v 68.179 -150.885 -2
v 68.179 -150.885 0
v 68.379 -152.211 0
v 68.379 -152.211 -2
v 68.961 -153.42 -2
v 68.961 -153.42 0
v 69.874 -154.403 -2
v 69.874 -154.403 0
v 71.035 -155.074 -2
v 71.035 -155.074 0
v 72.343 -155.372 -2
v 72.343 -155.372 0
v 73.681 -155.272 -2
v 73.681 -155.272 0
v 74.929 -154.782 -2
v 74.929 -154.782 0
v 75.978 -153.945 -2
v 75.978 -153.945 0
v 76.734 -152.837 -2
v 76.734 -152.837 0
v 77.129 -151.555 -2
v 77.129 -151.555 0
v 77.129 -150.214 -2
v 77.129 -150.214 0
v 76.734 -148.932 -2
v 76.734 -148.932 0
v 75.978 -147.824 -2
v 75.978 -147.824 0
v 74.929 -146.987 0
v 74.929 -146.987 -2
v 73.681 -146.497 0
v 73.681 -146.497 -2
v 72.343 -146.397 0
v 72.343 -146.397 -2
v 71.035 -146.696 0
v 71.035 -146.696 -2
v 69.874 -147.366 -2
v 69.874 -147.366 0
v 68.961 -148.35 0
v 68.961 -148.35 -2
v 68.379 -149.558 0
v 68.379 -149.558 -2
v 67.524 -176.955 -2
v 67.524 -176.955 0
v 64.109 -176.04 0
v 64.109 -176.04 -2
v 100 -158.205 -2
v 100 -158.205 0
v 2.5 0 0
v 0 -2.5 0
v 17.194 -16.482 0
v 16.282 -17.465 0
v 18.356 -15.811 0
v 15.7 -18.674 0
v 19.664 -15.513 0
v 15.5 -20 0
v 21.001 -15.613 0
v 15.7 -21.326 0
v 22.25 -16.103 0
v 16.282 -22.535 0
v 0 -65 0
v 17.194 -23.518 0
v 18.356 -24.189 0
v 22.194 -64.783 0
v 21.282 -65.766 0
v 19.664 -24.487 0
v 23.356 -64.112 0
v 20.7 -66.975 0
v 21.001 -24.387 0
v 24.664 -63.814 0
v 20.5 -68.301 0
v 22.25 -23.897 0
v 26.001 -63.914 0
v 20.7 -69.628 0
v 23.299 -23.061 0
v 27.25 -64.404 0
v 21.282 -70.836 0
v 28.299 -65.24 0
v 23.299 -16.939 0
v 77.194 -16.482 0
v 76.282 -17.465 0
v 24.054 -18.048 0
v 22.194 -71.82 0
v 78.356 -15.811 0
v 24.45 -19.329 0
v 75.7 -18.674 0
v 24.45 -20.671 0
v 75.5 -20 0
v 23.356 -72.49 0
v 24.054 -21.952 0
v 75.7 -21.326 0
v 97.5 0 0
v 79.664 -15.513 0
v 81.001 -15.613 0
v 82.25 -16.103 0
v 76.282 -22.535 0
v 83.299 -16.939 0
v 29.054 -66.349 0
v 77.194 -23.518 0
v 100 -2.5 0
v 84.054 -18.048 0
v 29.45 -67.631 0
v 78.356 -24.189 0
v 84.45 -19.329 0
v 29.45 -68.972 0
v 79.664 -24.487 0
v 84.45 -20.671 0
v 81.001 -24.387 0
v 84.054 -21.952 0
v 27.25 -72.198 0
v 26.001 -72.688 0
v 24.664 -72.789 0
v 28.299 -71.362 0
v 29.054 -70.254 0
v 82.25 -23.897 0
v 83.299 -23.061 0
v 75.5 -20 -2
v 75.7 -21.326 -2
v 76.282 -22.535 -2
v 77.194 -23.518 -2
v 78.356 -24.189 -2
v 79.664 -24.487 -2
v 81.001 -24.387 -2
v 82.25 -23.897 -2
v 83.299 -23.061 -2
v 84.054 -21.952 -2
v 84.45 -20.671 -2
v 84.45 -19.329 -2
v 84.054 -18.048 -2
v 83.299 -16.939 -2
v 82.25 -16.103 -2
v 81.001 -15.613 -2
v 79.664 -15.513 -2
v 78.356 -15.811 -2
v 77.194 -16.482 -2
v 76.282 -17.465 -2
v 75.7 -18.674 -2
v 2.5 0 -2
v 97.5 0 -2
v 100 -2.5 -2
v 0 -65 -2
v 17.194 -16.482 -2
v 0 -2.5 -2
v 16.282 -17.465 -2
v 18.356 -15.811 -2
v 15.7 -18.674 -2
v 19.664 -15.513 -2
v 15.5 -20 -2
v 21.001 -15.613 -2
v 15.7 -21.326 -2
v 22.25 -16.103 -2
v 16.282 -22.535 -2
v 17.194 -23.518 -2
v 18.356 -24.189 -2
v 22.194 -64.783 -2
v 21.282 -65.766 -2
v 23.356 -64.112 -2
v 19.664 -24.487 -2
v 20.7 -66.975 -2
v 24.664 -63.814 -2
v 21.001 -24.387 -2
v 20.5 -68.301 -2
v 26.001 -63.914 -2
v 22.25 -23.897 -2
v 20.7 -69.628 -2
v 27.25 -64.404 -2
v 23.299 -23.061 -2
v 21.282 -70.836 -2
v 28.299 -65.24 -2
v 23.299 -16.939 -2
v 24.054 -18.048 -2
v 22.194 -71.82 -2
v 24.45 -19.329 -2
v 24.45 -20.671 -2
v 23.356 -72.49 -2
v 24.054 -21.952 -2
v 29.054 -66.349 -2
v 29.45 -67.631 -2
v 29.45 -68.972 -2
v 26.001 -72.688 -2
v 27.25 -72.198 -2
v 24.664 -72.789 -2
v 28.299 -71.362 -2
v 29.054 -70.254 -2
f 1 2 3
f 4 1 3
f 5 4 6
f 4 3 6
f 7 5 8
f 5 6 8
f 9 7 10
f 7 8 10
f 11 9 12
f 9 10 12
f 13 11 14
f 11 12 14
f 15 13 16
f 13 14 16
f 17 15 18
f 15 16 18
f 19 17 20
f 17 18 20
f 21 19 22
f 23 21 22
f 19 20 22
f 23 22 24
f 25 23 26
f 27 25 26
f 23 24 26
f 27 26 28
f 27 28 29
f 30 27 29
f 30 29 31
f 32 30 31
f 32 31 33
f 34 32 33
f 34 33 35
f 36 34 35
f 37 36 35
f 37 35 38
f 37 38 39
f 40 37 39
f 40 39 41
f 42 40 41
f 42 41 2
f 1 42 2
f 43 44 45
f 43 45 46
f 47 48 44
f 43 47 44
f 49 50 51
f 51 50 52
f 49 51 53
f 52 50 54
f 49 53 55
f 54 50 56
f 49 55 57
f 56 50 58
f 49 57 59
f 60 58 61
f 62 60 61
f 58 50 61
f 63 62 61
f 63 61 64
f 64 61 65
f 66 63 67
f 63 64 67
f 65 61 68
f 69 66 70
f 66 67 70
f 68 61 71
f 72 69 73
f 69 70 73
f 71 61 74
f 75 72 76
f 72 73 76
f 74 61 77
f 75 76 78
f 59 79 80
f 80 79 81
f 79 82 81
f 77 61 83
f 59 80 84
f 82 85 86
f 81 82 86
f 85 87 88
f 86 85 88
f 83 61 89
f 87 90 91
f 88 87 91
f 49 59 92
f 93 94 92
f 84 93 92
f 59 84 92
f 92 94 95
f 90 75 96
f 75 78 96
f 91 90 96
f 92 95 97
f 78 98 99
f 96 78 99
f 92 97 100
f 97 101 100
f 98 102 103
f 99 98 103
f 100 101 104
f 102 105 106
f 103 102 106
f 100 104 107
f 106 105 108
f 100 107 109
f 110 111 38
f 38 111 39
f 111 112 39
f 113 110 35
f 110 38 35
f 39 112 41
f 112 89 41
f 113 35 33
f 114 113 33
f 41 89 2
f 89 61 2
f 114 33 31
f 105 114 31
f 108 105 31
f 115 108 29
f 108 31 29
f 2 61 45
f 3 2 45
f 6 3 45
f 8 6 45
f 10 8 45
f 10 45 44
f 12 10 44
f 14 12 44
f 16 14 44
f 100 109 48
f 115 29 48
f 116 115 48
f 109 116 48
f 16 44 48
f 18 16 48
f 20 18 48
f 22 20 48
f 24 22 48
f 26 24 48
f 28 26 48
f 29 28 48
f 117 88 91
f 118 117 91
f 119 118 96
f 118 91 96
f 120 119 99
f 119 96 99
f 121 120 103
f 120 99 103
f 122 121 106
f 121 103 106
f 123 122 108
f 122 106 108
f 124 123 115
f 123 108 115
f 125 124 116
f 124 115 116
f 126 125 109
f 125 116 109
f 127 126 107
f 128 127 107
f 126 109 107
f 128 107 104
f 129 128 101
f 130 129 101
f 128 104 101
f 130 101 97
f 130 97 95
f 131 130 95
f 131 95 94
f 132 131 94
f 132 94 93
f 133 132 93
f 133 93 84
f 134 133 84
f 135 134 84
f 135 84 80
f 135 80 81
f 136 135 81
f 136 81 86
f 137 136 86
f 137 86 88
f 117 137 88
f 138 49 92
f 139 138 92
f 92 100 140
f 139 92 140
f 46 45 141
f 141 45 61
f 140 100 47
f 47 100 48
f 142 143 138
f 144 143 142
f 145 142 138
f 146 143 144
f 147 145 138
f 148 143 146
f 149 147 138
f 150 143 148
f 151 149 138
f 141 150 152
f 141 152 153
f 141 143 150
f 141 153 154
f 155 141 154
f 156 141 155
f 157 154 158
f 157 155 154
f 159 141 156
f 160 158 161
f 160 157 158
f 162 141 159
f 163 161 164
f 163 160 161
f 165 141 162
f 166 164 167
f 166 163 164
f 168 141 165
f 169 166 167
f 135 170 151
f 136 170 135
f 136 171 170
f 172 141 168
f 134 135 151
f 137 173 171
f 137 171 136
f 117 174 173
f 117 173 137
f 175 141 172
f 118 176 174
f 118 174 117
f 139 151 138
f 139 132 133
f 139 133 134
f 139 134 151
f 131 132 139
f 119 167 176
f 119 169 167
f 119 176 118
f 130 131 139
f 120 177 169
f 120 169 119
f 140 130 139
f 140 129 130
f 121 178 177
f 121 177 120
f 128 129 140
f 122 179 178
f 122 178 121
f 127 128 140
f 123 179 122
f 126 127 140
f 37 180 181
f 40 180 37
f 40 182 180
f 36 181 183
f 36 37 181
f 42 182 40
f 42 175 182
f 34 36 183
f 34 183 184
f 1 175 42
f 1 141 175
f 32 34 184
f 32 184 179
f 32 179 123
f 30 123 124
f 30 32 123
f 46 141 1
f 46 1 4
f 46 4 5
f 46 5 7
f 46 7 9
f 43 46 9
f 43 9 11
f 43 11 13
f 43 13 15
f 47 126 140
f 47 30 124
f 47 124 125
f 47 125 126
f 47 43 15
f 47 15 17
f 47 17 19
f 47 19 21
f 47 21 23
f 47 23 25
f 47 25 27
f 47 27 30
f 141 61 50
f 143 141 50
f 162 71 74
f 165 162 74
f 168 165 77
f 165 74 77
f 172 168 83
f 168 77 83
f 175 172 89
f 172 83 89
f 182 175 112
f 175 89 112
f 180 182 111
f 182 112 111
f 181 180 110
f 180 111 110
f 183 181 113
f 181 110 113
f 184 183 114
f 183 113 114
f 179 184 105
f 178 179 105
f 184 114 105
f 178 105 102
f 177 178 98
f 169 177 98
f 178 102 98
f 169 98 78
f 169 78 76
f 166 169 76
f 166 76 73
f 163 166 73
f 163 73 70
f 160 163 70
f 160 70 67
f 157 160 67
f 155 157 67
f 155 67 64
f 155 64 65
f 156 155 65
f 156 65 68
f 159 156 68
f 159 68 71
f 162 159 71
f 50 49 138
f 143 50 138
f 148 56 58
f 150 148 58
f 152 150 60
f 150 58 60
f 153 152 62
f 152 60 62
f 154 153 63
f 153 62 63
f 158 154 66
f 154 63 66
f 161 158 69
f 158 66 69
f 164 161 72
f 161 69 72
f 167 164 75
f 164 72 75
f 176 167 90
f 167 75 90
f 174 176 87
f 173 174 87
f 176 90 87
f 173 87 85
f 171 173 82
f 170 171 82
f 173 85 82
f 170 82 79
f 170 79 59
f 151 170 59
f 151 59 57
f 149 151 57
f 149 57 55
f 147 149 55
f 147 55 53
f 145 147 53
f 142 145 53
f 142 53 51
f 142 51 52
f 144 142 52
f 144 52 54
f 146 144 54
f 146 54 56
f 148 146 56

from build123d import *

# Parameters (mm, degrees)
EXTRUDE_1_DEPTH   = 2
HOLE_WIZARD_M81_D = 9
CHAMFER_1_SIZE    = 2.5


with BuildPart() as part:
    # Эскиз3 → Бобышка-Вытянуть1 (new body)
    with BuildSketch(Plane(origin=(0, 0, 0), x_dir=(1, 0, 0), z_dir=(0, 0, -1))):
        Polygon((0, 0), (100, 0), (100, 158.205080757), (65.358983849, 178.205080757), (0, 65), align=None)
    extrude(amount=EXTRUDE_1_DEPTH)

    # Отверстие с зазором M81 (through all)
    with Locations(Plane(origin=(0, 0, -2), x_dir=(1, 0, 0), z_dir=(0, 0, -1))):
        with Locations((20, 20), (80, 20), (25, 68.301270189), (72.679491924, 150.884572681)):
            Hole(HOLE_WIZARD_M81_D / 2)

    # Фаска1
    chamfer_1_edges = [part.edges().sort_by_distance(p)[0] for p in [
        (65.358983849, -178.205080757, -1),
        (100, 0, -1),
        (0, 0, -1),
    ]]
    chamfer(chamfer_1_edges, length=CHAMFER_1_SIZE)


solid = part.part
